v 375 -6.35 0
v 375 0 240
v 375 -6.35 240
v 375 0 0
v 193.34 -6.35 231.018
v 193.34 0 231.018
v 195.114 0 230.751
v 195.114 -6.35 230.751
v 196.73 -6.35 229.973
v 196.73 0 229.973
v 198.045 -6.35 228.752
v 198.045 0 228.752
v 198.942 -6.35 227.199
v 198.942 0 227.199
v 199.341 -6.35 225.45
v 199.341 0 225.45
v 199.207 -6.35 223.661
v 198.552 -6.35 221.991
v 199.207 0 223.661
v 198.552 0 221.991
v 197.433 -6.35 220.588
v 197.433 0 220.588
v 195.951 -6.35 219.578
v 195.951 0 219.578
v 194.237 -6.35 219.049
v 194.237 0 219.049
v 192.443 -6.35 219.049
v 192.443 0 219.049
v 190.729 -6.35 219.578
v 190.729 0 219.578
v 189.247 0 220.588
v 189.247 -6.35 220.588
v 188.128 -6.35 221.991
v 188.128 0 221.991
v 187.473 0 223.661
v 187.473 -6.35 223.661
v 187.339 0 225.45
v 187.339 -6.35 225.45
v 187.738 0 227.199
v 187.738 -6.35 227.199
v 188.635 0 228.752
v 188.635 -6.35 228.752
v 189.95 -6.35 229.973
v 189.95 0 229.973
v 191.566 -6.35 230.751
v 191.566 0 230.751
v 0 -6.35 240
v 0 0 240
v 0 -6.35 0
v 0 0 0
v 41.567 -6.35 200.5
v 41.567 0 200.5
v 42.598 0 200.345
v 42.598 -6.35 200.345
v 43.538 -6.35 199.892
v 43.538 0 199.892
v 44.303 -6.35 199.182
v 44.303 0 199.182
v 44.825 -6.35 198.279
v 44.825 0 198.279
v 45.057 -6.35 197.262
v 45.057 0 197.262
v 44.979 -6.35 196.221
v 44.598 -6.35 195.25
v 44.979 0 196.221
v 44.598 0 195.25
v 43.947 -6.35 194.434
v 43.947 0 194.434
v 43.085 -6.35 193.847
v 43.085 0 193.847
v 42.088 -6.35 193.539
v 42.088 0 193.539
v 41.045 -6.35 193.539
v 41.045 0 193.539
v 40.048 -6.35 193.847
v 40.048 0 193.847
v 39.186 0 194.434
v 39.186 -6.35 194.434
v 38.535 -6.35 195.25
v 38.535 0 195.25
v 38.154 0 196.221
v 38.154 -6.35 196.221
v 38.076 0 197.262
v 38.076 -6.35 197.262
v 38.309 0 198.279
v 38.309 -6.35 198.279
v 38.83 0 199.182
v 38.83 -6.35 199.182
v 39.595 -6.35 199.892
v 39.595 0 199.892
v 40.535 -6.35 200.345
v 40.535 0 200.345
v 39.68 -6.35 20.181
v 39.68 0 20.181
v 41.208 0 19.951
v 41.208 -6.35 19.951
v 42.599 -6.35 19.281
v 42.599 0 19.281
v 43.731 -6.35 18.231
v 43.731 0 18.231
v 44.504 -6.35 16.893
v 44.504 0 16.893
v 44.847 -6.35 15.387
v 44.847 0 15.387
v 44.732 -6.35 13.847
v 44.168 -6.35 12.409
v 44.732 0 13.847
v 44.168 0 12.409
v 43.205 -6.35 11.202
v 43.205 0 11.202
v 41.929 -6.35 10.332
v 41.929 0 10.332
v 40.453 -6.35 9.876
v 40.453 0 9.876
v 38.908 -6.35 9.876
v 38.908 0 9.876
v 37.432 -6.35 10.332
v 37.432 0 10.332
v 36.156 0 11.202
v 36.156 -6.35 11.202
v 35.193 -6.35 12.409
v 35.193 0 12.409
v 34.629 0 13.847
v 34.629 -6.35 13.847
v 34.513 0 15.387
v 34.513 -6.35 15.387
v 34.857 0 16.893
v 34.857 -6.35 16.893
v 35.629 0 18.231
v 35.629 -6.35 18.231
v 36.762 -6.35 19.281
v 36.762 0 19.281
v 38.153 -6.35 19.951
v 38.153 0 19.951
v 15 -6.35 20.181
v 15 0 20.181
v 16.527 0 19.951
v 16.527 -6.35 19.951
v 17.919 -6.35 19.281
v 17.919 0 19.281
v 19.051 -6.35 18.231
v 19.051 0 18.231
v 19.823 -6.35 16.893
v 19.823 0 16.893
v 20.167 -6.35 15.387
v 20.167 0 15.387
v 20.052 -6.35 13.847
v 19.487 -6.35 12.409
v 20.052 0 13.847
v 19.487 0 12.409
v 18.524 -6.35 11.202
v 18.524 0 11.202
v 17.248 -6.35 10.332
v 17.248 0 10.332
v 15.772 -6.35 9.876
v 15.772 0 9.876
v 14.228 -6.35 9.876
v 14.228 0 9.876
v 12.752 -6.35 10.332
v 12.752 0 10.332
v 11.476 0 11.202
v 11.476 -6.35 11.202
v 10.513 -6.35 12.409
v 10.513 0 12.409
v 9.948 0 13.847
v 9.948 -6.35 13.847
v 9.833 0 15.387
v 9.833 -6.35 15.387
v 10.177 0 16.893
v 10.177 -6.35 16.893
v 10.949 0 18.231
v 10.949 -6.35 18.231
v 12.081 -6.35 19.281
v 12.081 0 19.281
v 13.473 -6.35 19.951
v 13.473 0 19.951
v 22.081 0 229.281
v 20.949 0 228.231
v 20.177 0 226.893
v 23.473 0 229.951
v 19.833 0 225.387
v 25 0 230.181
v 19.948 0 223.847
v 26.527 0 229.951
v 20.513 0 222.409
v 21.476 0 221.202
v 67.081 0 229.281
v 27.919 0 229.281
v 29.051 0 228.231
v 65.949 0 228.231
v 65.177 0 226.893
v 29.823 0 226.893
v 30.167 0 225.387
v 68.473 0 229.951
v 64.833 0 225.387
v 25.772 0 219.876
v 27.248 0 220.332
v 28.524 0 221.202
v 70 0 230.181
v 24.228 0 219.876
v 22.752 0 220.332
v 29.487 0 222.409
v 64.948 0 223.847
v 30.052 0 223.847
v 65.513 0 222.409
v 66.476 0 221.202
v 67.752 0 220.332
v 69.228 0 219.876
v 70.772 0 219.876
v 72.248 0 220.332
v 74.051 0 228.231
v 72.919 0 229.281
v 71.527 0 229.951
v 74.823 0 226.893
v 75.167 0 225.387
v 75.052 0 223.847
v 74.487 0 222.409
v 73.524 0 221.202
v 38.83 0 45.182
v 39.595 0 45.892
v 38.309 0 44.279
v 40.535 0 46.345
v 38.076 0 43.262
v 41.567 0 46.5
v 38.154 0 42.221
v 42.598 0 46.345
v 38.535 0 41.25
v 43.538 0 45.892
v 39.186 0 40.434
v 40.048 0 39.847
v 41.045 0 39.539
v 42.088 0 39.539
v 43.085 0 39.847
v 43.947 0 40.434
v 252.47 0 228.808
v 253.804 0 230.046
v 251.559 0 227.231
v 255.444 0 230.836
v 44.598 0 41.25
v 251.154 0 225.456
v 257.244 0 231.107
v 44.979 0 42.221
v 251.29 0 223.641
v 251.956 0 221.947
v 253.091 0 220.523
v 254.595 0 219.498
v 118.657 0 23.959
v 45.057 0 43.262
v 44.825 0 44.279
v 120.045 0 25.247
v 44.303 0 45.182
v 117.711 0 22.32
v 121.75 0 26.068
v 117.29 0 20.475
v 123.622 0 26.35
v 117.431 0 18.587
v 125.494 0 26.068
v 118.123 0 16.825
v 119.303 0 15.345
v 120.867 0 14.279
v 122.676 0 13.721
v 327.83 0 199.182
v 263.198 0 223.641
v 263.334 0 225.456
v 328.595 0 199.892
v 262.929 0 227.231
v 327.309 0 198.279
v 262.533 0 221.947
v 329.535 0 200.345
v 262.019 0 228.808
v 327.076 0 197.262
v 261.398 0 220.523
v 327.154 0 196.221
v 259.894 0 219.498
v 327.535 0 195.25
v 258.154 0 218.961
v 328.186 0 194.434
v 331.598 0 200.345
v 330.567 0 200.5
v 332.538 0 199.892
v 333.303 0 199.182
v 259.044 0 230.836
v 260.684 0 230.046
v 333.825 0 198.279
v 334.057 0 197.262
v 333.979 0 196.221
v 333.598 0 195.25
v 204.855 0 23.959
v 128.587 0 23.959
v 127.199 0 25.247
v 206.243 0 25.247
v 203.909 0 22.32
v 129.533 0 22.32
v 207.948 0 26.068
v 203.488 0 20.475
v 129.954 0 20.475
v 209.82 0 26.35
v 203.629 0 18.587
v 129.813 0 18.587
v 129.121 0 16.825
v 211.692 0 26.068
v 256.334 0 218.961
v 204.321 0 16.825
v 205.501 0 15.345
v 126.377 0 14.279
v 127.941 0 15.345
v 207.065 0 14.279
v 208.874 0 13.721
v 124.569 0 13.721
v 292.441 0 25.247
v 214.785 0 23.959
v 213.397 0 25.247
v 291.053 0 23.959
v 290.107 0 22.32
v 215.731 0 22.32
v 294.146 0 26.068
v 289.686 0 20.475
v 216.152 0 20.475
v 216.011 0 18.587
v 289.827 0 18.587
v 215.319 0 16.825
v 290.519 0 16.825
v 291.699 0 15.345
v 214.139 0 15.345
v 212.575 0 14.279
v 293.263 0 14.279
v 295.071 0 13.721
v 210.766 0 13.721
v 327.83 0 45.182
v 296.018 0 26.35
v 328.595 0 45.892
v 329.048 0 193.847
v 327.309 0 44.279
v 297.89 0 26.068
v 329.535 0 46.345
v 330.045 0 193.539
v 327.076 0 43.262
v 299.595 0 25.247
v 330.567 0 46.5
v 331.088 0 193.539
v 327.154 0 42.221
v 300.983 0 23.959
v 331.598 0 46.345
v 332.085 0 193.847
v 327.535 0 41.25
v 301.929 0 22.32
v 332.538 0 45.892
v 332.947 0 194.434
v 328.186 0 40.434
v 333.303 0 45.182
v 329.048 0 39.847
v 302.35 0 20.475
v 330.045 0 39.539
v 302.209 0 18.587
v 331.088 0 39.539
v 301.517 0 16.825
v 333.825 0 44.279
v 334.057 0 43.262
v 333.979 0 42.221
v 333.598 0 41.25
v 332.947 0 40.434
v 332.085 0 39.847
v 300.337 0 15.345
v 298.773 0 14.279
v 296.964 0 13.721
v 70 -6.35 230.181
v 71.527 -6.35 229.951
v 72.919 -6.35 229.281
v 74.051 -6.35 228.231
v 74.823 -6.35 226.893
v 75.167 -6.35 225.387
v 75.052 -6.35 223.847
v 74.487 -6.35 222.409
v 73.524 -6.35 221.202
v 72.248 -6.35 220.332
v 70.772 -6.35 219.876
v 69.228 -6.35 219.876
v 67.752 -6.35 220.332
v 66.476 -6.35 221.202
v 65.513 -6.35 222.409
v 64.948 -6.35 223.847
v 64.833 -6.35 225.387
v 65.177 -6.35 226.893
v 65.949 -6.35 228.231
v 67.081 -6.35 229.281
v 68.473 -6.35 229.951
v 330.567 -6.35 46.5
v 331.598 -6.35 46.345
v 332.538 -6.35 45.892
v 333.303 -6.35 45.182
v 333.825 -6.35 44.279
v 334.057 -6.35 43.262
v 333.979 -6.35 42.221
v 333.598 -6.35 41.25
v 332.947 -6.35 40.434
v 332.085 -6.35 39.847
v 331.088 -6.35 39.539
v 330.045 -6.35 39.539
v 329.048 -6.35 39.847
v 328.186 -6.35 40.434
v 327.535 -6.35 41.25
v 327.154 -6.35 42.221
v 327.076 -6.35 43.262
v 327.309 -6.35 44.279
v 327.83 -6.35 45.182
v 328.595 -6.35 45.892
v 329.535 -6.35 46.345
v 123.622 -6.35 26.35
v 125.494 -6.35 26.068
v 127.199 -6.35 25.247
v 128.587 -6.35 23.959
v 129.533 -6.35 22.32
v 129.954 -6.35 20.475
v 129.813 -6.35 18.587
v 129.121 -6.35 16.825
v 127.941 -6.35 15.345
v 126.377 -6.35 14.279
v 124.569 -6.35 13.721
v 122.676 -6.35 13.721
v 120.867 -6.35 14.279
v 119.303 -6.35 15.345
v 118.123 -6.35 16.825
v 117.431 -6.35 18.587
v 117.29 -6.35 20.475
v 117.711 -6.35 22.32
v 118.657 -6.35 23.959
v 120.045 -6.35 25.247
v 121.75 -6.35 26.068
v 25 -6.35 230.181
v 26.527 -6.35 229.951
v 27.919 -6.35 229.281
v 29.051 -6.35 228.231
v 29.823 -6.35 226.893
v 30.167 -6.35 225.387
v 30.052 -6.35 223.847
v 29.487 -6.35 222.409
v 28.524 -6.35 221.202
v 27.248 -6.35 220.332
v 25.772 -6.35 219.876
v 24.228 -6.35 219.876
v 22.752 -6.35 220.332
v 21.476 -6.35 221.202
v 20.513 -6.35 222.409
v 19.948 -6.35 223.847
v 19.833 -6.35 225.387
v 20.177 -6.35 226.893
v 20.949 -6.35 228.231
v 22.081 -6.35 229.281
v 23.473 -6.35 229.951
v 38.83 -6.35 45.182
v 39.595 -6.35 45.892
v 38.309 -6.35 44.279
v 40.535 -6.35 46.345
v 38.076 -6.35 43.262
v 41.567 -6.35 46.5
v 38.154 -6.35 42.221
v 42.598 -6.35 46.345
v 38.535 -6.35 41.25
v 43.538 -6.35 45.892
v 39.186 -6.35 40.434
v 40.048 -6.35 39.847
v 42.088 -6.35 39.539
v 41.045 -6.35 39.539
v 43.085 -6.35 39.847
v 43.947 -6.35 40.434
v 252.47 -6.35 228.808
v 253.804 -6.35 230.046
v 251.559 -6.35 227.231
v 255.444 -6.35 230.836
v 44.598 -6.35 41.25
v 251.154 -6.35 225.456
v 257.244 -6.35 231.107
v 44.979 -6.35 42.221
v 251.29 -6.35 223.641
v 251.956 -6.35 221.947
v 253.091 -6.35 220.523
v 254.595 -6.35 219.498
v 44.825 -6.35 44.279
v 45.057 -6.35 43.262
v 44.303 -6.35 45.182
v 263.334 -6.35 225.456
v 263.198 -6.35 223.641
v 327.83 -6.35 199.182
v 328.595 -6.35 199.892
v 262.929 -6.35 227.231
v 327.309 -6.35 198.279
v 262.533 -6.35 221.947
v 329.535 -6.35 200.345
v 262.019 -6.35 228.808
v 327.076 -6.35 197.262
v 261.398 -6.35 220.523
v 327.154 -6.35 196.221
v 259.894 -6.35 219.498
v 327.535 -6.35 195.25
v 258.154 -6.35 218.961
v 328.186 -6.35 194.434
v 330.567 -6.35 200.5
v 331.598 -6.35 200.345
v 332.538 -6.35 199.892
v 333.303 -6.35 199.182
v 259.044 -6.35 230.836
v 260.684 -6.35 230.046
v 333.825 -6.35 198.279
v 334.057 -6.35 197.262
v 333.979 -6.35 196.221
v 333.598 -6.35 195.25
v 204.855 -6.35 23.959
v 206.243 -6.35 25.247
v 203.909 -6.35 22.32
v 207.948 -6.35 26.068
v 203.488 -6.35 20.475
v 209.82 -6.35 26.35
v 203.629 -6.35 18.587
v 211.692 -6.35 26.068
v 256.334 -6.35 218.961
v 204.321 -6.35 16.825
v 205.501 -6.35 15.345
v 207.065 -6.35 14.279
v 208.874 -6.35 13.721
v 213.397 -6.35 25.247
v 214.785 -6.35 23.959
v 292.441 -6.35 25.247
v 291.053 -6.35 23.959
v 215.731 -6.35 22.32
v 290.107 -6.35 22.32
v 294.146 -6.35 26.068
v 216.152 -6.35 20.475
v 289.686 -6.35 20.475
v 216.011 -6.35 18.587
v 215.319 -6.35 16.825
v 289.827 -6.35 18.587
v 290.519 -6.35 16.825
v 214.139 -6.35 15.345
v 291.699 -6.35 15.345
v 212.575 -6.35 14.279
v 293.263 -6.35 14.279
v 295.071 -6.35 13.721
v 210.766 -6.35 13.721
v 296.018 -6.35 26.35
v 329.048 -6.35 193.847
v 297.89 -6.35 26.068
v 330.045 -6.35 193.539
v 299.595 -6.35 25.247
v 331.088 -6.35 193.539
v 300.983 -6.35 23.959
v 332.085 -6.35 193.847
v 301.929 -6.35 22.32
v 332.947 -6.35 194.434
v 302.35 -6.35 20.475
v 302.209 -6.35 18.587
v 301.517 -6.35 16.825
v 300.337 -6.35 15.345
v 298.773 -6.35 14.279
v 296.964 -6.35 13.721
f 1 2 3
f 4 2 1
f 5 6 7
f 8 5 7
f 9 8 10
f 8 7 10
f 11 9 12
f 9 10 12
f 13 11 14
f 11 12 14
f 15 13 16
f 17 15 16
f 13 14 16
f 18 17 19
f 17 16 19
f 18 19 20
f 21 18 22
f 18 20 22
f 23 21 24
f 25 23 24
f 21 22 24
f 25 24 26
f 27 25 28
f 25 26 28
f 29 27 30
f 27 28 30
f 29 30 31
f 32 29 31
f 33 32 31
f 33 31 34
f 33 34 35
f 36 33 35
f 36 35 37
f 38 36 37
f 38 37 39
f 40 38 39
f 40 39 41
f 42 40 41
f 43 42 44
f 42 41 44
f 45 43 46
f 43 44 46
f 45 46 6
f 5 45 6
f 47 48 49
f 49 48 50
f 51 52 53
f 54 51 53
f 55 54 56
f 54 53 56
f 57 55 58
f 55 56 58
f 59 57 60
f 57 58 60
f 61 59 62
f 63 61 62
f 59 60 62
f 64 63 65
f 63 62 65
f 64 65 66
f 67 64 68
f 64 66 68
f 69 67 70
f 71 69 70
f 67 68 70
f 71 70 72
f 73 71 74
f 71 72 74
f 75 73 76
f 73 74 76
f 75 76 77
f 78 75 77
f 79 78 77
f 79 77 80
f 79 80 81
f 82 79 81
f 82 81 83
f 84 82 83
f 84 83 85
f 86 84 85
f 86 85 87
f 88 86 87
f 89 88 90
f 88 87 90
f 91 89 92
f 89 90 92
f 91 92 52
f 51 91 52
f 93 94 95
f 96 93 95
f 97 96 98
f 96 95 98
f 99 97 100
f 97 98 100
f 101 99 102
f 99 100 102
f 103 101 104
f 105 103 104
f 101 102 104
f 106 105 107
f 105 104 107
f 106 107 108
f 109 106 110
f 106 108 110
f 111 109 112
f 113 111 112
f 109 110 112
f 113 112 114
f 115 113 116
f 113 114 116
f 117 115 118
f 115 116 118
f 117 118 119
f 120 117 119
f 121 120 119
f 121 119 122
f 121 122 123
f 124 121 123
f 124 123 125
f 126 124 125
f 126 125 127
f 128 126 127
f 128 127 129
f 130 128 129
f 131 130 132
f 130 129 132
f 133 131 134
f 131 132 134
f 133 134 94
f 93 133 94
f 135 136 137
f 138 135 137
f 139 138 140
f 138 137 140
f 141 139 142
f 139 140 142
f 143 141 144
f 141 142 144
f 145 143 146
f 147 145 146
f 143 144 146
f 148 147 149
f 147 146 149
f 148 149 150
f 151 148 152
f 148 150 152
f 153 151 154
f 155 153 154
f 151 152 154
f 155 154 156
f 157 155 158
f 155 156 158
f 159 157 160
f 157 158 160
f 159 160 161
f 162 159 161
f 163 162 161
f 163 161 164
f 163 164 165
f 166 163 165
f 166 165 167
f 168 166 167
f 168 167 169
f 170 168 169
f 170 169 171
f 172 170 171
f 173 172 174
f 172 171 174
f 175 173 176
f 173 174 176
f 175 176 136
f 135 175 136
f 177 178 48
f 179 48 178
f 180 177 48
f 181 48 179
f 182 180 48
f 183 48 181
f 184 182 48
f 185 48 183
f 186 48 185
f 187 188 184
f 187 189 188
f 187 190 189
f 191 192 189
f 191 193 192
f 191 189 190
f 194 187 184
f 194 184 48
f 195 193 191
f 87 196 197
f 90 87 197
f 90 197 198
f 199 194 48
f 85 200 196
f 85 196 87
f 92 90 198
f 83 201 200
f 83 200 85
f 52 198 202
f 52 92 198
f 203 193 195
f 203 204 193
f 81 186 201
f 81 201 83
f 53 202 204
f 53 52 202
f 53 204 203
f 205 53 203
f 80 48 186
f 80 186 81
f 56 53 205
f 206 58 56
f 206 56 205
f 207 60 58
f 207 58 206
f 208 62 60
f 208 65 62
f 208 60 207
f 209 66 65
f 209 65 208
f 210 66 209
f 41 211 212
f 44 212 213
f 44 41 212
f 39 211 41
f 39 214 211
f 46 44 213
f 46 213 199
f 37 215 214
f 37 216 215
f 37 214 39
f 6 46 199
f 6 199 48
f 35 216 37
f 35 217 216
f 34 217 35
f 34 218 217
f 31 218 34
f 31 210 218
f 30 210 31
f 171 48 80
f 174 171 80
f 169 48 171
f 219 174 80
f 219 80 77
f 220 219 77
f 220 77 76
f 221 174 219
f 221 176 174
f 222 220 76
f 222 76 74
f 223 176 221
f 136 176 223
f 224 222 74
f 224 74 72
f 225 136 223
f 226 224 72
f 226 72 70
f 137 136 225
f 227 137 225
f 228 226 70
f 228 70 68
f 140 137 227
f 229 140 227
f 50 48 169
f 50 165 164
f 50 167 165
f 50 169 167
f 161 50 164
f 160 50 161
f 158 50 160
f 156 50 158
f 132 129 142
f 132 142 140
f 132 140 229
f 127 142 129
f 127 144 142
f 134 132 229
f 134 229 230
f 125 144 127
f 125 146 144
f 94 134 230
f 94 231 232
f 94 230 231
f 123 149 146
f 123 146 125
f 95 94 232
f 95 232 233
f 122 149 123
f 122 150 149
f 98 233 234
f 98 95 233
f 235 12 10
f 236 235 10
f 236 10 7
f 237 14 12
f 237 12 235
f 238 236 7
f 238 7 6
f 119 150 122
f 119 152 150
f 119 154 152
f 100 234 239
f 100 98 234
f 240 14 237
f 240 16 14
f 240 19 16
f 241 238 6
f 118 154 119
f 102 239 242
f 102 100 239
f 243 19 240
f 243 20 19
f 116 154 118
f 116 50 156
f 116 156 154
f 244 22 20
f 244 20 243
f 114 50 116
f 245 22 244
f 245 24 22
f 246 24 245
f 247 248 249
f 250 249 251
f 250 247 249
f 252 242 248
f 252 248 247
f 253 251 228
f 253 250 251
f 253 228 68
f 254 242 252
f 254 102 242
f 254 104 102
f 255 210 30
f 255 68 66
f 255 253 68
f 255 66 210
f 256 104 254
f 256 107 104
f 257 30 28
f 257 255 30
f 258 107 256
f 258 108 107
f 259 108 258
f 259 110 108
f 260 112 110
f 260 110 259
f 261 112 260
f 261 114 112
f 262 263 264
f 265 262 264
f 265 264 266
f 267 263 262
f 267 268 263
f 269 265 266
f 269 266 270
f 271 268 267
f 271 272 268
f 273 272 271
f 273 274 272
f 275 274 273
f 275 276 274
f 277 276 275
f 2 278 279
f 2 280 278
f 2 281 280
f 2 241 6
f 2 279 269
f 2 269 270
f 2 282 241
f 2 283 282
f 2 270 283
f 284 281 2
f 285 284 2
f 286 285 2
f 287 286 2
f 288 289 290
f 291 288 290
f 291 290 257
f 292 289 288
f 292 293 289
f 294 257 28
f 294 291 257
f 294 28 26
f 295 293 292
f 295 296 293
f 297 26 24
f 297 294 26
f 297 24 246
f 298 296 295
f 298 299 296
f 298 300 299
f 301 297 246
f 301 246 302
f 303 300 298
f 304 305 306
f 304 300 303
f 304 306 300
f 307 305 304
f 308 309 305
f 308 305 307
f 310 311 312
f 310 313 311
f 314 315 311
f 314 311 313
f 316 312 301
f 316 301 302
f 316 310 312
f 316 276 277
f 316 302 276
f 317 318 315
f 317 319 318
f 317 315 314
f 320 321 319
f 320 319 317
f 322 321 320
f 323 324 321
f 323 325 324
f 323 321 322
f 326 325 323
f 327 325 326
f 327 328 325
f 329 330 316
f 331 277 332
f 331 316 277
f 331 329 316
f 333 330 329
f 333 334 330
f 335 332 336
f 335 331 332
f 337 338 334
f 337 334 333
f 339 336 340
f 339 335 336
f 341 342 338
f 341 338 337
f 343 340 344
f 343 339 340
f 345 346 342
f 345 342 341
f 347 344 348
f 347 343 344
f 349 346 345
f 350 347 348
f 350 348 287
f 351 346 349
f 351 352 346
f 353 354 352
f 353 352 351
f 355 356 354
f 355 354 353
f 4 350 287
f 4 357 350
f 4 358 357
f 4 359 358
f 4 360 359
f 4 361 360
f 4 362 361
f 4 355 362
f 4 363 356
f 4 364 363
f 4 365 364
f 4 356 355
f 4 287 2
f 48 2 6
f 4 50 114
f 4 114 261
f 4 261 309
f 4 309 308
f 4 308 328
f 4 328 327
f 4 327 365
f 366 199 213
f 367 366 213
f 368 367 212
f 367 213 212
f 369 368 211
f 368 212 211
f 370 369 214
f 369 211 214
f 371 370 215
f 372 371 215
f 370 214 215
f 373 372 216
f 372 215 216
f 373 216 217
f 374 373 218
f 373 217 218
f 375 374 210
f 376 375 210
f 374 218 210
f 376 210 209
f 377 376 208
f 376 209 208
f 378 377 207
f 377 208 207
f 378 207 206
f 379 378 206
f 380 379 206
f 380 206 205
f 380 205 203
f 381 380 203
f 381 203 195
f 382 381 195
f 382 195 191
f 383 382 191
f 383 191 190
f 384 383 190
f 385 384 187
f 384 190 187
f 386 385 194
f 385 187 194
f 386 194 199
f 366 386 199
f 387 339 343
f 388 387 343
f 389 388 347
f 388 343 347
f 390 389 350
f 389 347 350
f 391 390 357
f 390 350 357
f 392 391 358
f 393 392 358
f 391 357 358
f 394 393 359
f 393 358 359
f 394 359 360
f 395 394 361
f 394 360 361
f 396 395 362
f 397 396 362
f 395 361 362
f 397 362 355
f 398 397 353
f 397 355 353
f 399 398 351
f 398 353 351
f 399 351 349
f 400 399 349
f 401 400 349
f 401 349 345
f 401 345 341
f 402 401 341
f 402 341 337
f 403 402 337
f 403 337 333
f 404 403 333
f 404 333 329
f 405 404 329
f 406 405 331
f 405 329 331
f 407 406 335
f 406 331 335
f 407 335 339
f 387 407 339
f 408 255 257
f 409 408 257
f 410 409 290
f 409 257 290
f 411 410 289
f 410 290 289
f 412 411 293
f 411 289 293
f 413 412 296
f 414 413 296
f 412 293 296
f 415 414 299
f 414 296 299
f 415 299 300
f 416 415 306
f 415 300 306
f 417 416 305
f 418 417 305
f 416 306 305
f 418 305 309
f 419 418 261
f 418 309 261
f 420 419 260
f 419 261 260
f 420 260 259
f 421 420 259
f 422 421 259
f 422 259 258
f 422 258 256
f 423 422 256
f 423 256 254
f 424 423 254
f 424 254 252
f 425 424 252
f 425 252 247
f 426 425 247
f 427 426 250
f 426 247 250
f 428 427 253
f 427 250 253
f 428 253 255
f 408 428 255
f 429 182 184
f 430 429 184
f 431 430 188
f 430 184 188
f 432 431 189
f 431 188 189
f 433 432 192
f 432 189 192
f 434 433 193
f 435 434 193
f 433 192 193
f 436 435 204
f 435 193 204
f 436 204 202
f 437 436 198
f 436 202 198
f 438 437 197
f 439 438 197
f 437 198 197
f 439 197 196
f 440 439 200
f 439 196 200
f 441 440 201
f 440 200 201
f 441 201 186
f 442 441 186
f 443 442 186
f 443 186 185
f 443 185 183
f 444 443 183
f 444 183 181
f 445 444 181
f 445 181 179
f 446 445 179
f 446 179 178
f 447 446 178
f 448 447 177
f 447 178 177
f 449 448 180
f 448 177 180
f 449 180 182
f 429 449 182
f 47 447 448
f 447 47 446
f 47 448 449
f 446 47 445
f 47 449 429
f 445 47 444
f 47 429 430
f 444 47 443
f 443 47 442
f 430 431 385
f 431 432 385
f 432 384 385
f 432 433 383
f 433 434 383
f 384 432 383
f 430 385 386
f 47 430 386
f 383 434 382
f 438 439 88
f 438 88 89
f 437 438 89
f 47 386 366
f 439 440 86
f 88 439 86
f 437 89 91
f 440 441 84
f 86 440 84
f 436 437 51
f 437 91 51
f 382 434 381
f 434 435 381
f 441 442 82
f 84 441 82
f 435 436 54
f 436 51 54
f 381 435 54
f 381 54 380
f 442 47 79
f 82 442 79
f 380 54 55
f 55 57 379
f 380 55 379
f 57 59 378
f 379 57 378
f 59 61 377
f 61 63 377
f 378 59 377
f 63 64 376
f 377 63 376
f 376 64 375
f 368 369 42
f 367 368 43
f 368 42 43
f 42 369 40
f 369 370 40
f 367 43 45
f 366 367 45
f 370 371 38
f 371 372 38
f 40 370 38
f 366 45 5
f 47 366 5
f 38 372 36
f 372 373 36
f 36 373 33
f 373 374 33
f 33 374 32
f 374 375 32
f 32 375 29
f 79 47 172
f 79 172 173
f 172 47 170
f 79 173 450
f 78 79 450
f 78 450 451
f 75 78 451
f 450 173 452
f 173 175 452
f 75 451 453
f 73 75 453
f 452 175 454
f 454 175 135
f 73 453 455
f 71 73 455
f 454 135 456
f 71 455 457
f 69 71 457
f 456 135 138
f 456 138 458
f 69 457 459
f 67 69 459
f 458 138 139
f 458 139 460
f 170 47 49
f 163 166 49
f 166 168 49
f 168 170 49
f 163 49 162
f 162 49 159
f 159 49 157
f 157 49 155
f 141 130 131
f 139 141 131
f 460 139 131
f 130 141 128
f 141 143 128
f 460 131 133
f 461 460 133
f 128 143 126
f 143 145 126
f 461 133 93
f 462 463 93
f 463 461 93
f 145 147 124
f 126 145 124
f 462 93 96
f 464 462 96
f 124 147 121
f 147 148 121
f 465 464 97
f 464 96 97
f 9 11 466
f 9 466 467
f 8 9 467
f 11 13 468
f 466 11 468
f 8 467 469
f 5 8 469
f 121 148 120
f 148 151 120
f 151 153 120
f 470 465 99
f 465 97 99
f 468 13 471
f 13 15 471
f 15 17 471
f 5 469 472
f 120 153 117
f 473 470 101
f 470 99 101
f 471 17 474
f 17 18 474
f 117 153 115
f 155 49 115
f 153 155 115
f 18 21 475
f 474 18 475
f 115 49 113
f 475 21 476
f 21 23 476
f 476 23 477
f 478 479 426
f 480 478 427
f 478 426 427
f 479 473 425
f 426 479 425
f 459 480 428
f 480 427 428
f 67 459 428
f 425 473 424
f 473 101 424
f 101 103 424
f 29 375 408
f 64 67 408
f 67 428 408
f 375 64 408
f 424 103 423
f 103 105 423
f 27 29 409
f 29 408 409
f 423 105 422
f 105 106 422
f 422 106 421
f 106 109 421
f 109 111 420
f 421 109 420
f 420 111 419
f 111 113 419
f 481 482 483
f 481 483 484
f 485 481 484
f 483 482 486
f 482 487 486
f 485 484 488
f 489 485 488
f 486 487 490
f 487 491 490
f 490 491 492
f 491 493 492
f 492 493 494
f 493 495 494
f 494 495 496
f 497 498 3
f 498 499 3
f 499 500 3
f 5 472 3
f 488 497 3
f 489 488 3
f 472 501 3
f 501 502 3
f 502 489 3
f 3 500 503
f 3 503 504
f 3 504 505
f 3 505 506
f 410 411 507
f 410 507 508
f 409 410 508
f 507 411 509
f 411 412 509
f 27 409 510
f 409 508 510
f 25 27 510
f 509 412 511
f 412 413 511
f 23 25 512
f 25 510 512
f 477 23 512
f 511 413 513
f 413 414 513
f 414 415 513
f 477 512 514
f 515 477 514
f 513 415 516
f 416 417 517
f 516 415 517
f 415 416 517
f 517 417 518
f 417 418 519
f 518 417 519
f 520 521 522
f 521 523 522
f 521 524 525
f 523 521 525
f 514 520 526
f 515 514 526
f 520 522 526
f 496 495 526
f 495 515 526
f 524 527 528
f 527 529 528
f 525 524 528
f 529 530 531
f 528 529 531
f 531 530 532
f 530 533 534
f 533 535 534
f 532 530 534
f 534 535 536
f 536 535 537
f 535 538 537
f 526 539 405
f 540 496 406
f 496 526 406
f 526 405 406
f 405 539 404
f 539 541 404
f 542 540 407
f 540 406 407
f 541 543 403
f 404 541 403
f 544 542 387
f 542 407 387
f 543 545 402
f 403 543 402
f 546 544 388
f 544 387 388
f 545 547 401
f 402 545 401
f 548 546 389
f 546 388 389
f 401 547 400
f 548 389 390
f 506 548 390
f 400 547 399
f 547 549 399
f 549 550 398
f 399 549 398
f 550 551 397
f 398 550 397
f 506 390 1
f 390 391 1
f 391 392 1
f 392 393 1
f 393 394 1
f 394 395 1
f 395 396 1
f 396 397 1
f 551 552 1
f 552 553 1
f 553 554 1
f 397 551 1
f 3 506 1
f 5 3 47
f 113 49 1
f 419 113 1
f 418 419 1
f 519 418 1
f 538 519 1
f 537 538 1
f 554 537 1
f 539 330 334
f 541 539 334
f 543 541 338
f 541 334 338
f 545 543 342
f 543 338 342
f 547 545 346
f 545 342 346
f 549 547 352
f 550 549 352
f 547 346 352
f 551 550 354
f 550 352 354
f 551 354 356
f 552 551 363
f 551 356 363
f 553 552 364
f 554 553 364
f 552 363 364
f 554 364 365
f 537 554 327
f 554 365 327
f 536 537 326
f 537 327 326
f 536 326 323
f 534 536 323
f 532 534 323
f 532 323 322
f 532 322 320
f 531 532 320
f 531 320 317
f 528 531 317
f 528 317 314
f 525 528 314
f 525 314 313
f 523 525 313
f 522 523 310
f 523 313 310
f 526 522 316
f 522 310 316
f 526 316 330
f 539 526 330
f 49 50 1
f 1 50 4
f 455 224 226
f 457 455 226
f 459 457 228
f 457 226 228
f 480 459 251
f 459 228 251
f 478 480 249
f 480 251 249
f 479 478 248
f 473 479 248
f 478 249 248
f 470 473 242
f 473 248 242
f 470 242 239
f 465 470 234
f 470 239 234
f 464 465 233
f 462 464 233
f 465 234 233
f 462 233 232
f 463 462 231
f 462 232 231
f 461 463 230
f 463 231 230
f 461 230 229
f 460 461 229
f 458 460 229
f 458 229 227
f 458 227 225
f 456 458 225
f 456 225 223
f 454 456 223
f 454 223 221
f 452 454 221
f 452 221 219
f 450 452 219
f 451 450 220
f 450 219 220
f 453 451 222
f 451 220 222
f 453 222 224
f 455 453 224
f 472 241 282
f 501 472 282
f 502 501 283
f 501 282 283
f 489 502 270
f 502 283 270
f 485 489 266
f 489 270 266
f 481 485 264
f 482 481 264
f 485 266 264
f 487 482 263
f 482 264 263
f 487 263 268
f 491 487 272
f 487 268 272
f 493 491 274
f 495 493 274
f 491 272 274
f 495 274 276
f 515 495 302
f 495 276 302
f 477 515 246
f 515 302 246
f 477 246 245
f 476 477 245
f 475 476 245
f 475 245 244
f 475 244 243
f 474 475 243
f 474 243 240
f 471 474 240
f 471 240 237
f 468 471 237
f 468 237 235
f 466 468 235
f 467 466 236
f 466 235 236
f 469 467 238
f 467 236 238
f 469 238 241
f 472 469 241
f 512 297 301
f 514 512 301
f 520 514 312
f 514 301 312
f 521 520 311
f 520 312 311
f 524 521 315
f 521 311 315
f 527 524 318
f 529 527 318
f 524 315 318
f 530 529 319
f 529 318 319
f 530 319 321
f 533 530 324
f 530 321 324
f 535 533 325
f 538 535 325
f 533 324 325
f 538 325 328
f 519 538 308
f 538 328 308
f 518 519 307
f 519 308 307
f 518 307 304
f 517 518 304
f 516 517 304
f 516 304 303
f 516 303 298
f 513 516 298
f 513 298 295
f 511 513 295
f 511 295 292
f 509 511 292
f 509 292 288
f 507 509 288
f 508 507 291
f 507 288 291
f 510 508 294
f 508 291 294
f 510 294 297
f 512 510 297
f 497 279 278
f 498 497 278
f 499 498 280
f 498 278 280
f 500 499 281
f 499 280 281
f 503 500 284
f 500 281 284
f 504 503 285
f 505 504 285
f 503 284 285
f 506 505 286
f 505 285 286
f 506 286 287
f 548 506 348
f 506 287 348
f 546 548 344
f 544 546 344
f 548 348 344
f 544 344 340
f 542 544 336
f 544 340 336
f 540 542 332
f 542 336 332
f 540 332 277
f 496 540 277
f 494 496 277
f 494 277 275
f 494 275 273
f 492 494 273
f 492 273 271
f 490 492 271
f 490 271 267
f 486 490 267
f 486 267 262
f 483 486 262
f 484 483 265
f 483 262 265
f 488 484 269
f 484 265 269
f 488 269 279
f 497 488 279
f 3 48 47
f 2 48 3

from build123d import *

# Parameters (mm, degrees)
SKETCH1_W           = 375
SKETCH1_H           = 240
SKETCH1_R           = 5.181490122
SKETCH1_R_2         = 6.018247546
SKETCH1_R_3         = 6.106953205
SKETCH1_R_4         = 3.5
SKETCH1_R_5         = 6.35
BOSS_EXTRUDE1_DEPTH = 6.35


with BuildPart() as part:
    # Sketch1 → Boss-Extrude1 (new body)
    with BuildSketch(Plane(origin=(0, 0, 0), x_dir=(1, 0, 0), z_dir=(0, 1, 0))):
        with Locations((187.5, -120)):
            Rectangle(SKETCH1_W, SKETCH1_H)
        with Locations(Location((15, -15, 0), (0, 0, 270))):
            Circle(SKETCH1_R, mode=Mode.SUBTRACT)
        with Locations(Location((39.680379951, -15, 0), (0, 0, 270))):
            Circle(SKETCH1_R, mode=Mode.SUBTRACT)
        with Locations(Location((25, -225, 0), (0, 0, 270))):
            Circle(SKETCH1_R, mode=Mode.SUBTRACT)
        with Locations(Location((70, -225, 0), (0, 0, 270))):
            Circle(SKETCH1_R, mode=Mode.SUBTRACT)
        with Locations(Location((193.34, -225, 0), (0, 0, 270))):
            Circle(SKETCH1_R_2, mode=Mode.SUBTRACT)
        with Locations(Location((257.244291662, -225, 0), (0, 0, 270))):
            Circle(SKETCH1_R_3, mode=Mode.SUBTRACT)
        with Locations(Location((41.566569972, -43, 0), (0, 0, 270))):
            Circle(SKETCH1_R_4, mode=Mode.SUBTRACT)
        with Locations(Location((41.566569972, -197, 0), (0, 0, 270))):
            Circle(SKETCH1_R_4, mode=Mode.SUBTRACT)
        with Locations(Location((330.566569972, -197, 0), (0, 0, 270))):
            Circle(SKETCH1_R_4, mode=Mode.SUBTRACT)
        with Locations(Location((330.566569972, -43, 0), (0, 0, 270))):
            Circle(SKETCH1_R_4, mode=Mode.SUBTRACT)
        with Locations(Location((209.82, -20, 0), (0, 0, 270))):
            Circle(SKETCH1_R_5, mode=Mode.SUBTRACT)
        with Locations(Location((123.622084245, -20, 0), (0, 0, 270))):
            Circle(SKETCH1_R_5, mode=Mode.SUBTRACT)
        with Locations(Location((296.017915755, -20, 0), (0, 0, 270))):
            Circle(SKETCH1_R_5, mode=Mode.SUBTRACT)
    extrude(amount=-BOSS_EXTRUDE1_DEPTH)


solid = part.part
